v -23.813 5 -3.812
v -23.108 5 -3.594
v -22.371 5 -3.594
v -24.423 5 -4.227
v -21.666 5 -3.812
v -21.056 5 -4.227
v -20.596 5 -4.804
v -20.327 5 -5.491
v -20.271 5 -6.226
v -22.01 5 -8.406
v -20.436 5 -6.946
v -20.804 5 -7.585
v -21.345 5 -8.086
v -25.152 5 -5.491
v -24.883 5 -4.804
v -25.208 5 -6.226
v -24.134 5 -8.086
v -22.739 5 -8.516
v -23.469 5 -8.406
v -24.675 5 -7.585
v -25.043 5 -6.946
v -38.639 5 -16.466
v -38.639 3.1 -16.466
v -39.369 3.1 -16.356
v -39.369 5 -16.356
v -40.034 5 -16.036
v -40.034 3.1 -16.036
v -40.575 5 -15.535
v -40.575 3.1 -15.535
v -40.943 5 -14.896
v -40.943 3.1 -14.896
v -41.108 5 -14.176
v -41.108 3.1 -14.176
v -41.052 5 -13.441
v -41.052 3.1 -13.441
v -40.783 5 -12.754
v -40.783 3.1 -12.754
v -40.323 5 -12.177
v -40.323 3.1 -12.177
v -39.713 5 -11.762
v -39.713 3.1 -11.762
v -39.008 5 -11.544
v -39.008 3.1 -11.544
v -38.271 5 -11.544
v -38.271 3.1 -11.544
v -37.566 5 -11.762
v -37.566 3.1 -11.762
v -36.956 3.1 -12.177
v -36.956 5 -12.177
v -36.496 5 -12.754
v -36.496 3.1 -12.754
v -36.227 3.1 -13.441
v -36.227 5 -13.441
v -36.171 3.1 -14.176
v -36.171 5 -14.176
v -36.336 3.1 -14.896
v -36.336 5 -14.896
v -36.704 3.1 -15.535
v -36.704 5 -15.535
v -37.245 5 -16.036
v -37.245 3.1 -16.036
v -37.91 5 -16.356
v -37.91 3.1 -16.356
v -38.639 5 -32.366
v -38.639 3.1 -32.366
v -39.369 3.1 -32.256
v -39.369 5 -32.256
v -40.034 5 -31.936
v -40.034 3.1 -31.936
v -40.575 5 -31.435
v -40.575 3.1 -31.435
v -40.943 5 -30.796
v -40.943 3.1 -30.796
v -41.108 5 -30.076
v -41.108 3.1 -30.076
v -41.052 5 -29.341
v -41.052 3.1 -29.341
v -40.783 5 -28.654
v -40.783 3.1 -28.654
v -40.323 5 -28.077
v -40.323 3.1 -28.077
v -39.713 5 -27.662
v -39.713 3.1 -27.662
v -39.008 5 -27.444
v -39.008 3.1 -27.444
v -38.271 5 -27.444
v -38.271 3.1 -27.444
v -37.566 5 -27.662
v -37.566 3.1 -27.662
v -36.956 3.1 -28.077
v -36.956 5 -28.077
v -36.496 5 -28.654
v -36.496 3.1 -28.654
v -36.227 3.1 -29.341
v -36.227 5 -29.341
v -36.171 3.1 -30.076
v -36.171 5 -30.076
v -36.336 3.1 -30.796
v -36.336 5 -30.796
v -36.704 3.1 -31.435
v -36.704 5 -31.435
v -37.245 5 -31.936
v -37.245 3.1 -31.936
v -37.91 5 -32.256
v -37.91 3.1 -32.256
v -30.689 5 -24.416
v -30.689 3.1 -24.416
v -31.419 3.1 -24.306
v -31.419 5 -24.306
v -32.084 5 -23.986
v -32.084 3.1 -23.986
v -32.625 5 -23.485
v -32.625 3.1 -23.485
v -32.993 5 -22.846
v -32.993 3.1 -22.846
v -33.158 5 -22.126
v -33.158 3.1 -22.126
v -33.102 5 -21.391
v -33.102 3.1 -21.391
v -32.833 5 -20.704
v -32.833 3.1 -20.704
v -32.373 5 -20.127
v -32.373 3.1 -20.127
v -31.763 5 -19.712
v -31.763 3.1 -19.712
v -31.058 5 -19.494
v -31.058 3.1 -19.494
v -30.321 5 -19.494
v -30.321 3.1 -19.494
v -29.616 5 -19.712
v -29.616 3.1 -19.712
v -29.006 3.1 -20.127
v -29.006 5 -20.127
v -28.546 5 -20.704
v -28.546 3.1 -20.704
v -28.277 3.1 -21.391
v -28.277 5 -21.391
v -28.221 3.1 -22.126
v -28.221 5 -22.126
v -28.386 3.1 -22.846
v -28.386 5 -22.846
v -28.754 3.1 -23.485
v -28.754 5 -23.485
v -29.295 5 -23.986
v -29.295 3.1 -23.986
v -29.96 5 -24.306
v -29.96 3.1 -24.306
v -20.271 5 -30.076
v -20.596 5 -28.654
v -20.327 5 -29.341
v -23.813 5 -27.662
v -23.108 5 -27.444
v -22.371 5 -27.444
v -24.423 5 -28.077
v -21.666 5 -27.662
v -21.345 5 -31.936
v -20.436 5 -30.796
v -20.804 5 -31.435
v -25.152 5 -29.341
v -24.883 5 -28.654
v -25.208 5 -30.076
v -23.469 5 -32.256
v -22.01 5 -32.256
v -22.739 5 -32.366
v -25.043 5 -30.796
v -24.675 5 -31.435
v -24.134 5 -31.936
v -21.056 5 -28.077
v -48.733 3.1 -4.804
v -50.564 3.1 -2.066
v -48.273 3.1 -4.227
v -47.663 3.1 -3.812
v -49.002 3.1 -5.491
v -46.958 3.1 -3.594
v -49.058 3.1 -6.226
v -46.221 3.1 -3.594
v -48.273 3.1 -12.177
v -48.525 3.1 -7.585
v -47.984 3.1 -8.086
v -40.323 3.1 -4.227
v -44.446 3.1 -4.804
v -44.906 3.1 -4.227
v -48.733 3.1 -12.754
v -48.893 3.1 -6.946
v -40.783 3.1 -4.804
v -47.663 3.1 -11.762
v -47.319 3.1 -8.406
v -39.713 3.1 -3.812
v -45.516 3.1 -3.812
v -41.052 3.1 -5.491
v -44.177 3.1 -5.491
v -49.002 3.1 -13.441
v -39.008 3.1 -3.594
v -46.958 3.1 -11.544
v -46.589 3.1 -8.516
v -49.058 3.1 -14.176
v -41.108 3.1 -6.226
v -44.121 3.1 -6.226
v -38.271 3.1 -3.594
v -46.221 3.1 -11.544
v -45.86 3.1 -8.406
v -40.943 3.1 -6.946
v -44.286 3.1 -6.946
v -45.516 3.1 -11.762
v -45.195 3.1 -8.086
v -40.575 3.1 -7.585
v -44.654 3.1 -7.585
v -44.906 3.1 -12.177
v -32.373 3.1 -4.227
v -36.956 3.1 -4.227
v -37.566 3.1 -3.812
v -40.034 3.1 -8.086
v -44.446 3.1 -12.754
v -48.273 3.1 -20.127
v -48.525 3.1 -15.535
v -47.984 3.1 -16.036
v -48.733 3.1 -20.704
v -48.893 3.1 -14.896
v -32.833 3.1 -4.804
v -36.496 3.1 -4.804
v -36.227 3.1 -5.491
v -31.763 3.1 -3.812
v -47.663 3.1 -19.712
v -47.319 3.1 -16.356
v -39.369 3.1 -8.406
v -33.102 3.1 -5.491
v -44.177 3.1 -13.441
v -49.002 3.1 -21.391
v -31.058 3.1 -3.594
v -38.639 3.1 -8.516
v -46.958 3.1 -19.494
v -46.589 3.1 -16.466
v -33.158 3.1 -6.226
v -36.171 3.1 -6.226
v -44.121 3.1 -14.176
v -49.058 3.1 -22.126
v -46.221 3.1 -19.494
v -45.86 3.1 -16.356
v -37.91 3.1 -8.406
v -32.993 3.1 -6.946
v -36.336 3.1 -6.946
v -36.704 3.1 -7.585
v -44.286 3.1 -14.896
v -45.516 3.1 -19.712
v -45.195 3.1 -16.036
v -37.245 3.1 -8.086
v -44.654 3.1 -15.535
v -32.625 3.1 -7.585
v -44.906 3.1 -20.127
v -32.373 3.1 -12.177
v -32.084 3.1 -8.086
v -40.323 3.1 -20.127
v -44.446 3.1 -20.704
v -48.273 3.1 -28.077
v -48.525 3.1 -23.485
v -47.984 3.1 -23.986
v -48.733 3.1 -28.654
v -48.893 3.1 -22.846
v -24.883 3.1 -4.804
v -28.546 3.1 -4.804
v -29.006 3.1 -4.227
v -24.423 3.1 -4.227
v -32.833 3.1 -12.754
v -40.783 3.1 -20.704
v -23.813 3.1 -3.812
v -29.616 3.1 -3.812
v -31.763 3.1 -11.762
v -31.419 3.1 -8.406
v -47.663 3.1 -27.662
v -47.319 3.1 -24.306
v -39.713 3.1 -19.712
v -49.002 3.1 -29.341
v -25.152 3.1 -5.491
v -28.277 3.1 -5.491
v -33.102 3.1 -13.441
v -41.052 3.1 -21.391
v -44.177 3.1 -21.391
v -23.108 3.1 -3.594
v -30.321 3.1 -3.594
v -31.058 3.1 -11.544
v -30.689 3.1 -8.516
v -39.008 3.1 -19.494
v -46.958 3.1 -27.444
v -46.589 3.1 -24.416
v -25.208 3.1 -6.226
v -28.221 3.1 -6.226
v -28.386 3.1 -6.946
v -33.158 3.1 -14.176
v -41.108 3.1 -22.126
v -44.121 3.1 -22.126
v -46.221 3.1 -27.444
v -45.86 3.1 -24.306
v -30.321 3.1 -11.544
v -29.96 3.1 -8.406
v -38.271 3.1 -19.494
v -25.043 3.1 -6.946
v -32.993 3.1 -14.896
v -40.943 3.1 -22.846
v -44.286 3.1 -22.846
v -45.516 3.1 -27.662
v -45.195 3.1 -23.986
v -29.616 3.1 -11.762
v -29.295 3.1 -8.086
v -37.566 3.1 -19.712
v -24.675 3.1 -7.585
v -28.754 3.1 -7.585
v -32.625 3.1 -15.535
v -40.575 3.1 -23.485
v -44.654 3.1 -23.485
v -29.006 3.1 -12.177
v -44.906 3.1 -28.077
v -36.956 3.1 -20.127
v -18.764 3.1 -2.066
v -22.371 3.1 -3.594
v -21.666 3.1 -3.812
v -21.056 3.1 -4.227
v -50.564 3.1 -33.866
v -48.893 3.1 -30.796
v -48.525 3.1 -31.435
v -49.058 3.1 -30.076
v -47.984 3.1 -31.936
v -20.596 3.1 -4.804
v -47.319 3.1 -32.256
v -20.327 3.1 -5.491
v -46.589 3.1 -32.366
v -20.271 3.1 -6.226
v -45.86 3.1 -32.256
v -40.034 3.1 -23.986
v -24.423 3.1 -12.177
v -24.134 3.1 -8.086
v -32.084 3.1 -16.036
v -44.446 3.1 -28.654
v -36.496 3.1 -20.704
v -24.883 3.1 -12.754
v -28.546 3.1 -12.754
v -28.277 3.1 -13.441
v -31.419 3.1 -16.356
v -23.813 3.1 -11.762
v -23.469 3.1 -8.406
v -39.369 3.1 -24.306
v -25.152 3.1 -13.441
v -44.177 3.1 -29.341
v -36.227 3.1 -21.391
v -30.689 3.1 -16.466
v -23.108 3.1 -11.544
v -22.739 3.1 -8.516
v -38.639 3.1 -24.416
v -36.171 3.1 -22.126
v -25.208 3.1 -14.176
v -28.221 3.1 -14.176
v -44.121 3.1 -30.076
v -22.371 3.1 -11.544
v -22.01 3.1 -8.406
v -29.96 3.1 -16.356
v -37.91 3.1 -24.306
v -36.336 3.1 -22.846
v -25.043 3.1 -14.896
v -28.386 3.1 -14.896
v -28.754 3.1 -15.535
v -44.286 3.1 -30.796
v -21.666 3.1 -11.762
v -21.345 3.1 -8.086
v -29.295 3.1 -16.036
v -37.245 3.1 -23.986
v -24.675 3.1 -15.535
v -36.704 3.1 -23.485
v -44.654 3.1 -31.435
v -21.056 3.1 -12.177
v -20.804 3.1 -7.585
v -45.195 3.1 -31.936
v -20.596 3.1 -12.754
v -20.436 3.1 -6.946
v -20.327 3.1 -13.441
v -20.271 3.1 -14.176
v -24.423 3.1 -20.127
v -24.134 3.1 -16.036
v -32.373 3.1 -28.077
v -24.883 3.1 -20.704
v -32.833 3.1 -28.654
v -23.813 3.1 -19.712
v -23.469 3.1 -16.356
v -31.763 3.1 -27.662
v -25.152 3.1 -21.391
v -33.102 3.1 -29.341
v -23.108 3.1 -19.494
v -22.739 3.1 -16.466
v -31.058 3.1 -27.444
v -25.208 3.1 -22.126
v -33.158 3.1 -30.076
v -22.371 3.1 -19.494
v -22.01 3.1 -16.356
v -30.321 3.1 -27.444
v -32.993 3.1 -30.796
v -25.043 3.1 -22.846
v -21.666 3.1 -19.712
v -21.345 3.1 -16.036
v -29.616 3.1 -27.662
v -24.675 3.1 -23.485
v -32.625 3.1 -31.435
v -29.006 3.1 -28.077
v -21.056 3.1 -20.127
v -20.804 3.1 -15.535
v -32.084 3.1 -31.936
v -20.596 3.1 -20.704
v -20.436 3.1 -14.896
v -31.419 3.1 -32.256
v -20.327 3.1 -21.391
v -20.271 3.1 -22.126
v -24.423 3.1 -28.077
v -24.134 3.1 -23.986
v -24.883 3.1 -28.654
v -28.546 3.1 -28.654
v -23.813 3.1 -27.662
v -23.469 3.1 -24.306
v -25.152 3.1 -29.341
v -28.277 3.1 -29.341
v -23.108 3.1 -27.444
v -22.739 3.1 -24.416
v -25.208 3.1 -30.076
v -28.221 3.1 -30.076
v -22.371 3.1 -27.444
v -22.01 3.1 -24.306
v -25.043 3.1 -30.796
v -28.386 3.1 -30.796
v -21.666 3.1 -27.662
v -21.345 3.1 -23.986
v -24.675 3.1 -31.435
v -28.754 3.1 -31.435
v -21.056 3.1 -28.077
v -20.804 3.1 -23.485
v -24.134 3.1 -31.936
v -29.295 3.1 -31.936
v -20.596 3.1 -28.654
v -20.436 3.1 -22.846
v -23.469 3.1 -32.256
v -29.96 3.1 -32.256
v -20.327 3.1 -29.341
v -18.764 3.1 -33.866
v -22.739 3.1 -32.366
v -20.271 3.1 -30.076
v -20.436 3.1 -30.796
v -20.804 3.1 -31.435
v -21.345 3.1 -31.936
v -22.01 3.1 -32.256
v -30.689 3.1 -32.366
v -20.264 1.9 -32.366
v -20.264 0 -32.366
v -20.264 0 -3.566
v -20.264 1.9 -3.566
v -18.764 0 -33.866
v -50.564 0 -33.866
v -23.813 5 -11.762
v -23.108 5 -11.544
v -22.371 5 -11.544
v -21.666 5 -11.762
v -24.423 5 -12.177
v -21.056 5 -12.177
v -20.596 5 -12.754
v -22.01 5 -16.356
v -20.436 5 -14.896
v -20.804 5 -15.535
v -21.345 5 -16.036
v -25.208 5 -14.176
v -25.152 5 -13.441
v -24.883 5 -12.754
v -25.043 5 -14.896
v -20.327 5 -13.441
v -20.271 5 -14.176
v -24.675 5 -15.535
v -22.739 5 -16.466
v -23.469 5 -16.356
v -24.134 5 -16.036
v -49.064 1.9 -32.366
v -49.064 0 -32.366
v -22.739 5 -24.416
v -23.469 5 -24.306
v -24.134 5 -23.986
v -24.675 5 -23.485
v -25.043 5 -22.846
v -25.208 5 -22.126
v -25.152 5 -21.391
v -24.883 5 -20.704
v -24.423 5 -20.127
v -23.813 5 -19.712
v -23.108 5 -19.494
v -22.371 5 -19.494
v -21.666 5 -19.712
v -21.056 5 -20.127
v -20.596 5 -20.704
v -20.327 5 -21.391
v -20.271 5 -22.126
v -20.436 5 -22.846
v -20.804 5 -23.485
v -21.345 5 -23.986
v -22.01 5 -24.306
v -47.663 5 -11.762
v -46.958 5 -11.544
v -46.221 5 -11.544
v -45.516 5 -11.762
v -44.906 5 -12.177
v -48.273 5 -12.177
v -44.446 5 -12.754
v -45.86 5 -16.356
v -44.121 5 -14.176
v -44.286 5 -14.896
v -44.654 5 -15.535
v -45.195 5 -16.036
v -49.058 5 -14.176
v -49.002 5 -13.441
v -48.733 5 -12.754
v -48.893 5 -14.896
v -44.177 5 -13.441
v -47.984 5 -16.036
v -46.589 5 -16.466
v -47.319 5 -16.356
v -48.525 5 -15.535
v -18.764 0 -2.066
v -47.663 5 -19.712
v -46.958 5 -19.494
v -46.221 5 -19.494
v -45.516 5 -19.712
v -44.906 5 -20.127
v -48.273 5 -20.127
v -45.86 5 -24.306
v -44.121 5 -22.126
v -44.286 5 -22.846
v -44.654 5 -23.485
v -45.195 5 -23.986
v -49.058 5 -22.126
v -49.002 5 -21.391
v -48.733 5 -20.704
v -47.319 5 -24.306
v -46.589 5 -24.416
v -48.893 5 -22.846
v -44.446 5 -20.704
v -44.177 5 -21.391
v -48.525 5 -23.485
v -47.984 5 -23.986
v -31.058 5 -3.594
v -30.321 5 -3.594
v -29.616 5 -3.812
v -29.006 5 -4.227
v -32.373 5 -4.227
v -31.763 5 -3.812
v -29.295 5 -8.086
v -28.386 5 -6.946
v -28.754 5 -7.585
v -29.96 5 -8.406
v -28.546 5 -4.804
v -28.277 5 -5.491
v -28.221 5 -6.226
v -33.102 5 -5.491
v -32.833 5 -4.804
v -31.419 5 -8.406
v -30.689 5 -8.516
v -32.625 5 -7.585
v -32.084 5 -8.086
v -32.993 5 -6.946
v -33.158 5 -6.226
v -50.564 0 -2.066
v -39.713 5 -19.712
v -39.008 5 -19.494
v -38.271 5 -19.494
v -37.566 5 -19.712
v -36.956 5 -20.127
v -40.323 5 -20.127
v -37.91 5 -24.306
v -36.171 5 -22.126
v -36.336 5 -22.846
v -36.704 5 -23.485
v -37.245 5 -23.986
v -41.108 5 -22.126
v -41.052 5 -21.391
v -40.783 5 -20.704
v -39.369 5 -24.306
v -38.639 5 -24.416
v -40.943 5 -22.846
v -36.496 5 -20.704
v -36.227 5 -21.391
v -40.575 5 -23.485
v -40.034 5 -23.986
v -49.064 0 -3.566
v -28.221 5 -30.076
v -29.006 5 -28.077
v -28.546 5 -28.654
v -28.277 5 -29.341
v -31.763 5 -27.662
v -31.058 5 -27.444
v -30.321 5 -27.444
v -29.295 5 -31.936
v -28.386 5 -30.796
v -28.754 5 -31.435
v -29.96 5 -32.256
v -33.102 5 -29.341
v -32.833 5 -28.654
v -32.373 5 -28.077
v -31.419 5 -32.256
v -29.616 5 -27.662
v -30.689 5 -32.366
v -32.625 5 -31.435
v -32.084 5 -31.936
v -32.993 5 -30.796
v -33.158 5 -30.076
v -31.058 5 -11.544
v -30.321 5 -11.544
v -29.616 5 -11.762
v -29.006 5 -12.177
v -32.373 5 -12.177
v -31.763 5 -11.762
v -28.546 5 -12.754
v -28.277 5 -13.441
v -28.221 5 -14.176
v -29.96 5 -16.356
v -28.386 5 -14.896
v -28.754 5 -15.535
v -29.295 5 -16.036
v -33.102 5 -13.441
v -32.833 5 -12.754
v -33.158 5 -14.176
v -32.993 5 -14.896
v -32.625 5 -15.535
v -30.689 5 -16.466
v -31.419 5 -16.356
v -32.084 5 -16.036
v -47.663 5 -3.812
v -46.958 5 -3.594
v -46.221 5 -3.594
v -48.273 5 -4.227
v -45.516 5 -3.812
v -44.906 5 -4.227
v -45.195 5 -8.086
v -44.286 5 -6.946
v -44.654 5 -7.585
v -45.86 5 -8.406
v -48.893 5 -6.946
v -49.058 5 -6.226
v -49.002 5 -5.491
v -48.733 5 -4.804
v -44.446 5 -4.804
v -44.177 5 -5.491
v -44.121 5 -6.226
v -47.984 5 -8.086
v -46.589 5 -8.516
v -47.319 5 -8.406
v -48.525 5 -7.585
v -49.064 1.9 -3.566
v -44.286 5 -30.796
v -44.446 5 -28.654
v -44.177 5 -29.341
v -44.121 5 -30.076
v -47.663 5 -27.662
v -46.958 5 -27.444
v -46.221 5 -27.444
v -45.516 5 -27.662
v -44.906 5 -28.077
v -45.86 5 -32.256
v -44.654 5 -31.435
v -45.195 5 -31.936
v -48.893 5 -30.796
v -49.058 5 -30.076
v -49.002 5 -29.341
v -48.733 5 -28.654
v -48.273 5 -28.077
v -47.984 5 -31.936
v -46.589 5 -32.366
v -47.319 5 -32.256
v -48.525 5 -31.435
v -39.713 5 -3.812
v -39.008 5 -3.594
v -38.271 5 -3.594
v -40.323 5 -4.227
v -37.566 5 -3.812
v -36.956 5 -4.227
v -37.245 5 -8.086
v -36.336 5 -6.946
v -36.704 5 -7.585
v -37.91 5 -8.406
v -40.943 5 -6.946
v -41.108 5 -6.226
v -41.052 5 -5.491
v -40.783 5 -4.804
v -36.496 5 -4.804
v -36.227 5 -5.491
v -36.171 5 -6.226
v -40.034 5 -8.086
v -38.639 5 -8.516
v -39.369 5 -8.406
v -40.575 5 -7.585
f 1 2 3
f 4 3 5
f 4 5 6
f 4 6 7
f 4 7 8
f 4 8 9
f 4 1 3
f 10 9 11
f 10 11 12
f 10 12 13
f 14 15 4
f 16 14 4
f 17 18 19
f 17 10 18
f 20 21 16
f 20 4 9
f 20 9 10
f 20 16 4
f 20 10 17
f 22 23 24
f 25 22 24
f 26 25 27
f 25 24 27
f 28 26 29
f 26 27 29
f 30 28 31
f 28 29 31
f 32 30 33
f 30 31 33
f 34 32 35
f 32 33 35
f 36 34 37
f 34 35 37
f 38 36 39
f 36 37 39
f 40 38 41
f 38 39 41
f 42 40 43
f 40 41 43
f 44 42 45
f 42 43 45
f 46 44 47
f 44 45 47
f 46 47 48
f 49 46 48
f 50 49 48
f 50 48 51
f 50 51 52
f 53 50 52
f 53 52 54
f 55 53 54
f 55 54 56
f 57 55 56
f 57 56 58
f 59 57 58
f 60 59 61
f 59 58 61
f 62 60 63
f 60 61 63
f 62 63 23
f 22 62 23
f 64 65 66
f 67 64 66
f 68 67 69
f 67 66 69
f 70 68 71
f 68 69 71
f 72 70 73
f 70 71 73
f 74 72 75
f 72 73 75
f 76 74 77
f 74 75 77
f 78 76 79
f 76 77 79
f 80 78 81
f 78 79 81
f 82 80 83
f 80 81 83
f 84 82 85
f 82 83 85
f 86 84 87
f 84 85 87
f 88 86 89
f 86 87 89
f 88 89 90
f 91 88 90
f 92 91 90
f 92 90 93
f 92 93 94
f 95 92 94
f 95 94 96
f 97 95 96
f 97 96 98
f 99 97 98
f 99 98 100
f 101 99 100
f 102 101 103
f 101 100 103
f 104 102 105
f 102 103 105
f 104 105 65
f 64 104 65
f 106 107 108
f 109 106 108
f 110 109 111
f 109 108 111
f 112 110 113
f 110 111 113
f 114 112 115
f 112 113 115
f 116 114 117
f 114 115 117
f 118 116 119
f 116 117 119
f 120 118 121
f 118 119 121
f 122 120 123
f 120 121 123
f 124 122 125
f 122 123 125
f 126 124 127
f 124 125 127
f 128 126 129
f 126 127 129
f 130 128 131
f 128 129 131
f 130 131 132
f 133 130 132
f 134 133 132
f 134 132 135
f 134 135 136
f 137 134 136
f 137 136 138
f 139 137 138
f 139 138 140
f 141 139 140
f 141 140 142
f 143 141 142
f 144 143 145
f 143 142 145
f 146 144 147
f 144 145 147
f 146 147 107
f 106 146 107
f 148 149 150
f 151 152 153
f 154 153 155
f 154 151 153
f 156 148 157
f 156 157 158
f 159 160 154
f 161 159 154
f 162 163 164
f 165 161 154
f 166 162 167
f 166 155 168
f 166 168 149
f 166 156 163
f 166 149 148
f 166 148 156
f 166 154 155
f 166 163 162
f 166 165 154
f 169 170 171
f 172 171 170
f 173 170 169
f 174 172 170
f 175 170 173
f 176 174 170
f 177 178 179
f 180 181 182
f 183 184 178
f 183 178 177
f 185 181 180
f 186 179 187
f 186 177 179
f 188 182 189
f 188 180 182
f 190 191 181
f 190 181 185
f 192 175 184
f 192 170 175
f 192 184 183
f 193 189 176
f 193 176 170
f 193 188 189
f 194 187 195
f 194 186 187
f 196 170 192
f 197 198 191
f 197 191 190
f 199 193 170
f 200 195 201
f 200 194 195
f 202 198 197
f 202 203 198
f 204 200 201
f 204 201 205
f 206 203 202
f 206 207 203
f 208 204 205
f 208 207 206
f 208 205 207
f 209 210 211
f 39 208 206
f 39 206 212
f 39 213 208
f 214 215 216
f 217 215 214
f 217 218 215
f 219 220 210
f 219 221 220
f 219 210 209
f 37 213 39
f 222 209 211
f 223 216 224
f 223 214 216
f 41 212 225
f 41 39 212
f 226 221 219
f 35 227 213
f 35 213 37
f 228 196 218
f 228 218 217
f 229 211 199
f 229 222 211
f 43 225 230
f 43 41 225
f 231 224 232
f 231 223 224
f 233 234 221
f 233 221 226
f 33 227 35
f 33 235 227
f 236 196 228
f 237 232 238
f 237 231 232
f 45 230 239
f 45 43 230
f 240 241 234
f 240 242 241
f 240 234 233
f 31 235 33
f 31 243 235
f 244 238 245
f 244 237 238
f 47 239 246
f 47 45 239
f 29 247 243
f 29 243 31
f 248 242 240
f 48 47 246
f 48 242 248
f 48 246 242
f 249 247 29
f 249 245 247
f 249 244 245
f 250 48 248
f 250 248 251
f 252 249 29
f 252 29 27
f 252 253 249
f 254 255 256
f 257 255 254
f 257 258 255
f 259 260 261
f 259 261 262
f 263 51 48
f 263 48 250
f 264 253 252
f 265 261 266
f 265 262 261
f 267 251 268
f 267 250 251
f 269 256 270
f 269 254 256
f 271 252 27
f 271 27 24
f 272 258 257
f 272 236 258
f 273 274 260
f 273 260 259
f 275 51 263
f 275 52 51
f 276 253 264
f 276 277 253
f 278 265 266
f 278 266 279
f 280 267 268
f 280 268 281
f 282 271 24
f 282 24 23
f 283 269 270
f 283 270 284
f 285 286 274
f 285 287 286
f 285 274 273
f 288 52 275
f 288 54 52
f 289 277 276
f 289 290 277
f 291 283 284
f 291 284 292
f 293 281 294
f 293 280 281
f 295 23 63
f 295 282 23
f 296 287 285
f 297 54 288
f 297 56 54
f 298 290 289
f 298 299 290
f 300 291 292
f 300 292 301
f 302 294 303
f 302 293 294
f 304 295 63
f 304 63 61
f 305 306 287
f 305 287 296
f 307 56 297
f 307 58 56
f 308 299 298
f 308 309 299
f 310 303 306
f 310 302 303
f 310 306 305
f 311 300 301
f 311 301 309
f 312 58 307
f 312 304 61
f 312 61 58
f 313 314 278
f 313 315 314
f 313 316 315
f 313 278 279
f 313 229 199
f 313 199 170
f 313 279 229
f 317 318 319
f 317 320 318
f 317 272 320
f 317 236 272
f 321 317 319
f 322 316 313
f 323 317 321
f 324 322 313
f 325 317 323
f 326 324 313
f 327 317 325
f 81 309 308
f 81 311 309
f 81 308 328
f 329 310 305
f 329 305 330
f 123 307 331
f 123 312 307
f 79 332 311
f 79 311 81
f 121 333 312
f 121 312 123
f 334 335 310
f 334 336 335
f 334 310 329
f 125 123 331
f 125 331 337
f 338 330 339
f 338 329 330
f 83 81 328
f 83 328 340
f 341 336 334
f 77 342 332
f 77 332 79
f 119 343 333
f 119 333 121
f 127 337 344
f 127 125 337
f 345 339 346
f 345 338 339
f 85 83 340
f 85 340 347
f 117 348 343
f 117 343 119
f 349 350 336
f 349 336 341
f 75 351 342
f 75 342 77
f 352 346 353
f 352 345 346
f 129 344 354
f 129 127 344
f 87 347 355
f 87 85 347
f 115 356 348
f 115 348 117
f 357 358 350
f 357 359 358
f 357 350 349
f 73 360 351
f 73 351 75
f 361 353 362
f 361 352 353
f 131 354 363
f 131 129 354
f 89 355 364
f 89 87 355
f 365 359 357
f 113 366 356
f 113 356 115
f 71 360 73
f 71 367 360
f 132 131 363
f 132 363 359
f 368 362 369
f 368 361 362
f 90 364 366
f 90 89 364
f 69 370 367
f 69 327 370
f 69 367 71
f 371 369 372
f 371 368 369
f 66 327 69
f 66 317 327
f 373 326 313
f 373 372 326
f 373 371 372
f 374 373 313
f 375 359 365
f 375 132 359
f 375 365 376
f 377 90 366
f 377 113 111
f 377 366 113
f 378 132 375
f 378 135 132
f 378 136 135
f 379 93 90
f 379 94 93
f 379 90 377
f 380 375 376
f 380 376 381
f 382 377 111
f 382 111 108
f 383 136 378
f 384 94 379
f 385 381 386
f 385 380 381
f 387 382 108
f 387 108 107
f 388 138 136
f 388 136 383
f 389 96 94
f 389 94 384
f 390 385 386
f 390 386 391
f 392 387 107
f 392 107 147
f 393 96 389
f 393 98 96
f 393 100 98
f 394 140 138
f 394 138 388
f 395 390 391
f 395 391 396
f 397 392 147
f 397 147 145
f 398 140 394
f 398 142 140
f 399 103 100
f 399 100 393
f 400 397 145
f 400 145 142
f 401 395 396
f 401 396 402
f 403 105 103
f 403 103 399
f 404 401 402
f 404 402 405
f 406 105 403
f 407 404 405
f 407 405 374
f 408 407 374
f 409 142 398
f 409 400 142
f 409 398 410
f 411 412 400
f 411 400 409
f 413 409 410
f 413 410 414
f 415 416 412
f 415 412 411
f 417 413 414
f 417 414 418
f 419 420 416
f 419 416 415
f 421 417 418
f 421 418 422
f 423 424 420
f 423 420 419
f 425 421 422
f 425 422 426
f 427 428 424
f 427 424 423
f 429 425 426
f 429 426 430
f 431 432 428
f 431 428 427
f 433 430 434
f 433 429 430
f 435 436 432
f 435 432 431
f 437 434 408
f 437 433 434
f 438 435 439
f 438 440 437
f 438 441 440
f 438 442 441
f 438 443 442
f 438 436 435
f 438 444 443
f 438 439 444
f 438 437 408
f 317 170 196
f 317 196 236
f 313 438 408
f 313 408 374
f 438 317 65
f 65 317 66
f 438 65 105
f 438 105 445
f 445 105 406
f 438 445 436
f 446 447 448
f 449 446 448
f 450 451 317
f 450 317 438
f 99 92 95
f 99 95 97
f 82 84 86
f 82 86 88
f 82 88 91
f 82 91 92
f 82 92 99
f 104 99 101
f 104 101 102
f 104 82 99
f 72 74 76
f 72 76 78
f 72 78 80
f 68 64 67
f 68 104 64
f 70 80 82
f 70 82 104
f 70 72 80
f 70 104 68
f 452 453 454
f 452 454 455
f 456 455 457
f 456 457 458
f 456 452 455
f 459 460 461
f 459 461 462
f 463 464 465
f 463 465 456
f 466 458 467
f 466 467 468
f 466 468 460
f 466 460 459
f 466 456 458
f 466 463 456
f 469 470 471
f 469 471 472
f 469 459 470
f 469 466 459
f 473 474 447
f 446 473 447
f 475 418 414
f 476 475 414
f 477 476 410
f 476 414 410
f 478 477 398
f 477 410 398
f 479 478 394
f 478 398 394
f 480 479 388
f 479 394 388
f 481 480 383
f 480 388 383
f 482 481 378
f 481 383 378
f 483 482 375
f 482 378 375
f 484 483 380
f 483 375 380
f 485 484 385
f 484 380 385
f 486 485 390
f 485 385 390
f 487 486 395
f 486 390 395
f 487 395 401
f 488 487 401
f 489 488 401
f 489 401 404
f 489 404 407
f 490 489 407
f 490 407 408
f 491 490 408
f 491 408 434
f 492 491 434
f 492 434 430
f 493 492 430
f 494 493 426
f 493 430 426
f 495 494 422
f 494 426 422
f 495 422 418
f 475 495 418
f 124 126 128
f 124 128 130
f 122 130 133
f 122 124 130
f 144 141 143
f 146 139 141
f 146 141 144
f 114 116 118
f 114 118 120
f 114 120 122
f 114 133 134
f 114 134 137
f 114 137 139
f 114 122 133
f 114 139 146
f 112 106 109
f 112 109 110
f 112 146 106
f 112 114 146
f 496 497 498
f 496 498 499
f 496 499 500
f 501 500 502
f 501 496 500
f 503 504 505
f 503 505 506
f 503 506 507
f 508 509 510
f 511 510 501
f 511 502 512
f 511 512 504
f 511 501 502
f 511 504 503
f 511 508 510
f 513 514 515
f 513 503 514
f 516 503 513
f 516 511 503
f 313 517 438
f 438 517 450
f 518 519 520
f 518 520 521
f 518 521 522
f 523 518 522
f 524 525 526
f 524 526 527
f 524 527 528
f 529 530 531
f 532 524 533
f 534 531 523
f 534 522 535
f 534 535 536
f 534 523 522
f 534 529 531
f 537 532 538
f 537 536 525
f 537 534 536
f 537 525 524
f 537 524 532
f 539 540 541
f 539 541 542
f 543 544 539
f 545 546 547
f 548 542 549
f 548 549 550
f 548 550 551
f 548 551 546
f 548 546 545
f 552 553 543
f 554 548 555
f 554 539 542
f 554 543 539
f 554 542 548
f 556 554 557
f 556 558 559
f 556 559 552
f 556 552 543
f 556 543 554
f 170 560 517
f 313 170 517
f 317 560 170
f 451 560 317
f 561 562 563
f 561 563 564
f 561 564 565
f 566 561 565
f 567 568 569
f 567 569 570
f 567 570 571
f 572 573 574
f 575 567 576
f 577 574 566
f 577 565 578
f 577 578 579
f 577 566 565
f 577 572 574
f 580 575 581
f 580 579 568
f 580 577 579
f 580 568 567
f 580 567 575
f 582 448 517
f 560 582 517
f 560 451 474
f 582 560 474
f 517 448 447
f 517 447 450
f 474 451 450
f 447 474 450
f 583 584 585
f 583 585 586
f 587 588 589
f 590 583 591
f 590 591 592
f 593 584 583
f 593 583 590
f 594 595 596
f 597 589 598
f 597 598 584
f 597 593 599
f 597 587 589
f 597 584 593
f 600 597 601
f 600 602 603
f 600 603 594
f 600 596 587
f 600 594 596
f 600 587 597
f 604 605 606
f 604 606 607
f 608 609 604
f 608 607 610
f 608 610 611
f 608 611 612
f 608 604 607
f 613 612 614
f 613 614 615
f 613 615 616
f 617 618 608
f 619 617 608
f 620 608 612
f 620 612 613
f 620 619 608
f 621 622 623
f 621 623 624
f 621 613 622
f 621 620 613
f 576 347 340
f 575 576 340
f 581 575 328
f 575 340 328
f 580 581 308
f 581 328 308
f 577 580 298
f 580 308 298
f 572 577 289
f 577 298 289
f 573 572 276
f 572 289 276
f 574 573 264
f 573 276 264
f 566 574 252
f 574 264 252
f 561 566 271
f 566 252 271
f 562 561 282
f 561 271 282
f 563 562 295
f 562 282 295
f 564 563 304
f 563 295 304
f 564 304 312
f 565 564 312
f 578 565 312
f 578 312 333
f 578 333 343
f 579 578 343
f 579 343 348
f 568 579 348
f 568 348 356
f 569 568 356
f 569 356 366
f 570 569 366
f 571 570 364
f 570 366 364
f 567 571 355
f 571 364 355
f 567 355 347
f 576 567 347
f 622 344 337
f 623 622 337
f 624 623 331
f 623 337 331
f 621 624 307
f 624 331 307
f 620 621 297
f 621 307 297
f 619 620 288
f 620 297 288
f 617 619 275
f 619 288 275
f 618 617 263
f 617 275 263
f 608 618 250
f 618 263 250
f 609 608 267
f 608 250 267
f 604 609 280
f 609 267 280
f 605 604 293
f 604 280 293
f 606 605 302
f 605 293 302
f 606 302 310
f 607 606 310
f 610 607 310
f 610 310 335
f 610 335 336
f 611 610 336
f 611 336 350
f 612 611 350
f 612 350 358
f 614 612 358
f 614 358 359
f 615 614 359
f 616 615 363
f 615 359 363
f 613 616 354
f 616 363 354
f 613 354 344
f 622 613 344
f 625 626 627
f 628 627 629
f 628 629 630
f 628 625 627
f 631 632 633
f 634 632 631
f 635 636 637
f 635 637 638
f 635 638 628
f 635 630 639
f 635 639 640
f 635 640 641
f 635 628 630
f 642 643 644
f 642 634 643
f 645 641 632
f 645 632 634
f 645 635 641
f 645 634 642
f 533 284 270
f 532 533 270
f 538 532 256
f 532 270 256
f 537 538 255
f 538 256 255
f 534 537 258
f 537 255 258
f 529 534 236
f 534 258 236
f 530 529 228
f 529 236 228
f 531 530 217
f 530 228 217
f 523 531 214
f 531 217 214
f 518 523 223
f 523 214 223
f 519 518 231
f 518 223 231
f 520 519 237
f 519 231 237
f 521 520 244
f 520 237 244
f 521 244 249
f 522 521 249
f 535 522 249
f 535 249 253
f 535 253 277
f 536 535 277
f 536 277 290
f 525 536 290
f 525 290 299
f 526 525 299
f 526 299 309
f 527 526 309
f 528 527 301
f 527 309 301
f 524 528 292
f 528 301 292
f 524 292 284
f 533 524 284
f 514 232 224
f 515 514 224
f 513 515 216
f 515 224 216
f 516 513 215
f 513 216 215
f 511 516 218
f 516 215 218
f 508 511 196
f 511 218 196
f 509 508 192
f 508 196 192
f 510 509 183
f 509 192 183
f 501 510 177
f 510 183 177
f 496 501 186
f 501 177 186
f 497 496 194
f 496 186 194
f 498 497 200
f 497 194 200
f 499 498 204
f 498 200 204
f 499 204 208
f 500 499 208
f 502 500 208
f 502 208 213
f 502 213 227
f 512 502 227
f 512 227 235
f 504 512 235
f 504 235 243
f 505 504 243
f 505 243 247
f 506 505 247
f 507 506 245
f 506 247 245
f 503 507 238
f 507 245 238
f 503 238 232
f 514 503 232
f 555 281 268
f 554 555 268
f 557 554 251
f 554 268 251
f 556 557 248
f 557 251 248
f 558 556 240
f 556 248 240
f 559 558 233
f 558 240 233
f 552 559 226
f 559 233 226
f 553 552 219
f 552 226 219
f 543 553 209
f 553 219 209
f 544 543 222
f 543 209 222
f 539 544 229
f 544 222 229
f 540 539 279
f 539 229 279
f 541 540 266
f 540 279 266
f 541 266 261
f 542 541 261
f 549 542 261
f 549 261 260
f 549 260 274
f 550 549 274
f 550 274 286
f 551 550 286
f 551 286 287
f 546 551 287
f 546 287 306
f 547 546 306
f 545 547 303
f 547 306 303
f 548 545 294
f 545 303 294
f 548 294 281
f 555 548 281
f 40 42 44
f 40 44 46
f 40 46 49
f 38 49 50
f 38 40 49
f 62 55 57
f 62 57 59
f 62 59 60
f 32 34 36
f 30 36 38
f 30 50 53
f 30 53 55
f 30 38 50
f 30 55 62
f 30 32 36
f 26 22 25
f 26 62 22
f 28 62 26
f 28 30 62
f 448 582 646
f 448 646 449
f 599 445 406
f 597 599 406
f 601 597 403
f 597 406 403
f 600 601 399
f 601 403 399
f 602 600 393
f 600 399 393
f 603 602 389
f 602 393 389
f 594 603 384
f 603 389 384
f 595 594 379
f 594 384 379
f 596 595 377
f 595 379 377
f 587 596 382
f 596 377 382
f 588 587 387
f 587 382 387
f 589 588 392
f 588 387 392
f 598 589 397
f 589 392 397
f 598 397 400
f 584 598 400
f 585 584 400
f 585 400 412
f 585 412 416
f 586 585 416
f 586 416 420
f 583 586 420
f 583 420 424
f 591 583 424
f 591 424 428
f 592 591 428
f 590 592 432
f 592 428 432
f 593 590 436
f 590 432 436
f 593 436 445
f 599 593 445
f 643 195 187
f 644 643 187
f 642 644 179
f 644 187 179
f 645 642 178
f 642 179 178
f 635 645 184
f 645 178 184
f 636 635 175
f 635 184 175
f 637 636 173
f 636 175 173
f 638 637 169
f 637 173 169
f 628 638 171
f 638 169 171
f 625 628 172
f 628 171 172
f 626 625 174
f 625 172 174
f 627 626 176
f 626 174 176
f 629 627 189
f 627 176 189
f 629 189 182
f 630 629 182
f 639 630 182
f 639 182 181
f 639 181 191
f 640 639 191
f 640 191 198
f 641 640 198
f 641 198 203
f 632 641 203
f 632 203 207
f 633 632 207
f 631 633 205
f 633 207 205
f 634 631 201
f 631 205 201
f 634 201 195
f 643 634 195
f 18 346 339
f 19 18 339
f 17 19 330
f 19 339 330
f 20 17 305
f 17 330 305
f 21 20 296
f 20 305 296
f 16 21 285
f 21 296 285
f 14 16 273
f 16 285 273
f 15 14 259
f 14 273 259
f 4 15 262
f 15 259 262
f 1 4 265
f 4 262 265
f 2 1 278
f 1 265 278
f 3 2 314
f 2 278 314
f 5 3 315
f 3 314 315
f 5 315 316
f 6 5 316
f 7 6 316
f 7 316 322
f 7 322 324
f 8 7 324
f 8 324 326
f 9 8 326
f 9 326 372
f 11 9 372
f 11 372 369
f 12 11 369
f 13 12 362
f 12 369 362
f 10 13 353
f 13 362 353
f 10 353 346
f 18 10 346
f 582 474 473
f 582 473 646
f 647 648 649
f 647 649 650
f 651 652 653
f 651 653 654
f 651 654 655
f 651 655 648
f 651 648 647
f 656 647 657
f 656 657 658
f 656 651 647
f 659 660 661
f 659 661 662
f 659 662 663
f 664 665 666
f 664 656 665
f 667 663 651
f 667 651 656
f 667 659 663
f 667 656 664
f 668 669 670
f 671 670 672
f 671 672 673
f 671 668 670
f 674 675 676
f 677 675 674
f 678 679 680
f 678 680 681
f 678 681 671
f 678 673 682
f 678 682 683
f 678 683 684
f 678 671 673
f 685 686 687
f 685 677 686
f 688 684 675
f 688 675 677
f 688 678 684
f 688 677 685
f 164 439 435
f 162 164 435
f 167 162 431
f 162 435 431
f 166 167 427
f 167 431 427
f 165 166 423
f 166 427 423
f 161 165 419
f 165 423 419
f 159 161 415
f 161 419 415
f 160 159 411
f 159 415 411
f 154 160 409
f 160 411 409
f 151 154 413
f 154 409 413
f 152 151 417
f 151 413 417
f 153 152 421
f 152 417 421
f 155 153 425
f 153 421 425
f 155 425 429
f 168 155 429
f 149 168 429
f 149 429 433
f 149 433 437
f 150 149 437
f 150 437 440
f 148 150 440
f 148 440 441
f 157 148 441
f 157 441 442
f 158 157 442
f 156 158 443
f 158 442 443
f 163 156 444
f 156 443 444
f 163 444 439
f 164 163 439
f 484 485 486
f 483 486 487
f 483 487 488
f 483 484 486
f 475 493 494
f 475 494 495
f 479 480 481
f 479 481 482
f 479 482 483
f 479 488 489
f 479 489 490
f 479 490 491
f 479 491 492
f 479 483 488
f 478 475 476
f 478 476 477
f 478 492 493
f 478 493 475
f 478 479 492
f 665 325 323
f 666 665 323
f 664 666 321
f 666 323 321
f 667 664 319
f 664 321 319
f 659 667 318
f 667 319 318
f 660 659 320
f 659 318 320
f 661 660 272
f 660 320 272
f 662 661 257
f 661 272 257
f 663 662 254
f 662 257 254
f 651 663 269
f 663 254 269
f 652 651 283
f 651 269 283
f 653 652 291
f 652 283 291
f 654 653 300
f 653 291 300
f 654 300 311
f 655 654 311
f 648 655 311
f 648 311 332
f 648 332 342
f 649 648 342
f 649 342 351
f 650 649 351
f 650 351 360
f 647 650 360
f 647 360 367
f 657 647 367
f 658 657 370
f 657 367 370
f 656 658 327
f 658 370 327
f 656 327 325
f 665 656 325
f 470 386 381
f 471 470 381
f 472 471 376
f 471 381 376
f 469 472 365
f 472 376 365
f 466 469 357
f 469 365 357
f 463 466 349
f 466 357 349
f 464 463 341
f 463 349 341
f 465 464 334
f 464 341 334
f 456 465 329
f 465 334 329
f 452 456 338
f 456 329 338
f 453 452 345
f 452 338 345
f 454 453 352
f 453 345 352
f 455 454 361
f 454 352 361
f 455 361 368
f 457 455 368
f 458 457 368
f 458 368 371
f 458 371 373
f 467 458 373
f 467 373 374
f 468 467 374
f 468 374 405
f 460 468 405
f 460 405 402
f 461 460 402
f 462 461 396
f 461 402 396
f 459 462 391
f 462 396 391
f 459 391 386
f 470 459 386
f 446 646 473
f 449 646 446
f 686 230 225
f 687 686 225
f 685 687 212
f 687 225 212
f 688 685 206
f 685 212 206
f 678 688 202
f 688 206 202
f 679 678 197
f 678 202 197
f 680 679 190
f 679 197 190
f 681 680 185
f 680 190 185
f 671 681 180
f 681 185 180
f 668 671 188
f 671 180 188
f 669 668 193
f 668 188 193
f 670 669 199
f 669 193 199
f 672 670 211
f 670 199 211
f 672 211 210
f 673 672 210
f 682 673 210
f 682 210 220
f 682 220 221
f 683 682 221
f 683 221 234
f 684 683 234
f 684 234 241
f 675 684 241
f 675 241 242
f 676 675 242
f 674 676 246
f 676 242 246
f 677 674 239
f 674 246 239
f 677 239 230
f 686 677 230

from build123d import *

# Parameters (mm, degrees)
SKETCH1_W           = 31.8
SKETCH1_H           = 31.8
BOSS_EXTRUDE1_DEPTH = 3.1
SKETCH2_W           = 28.8
SKETCH2_H           = 28.8
CUT_EXTRUDE1_DEPTH  = 1.9
SKETCH3_R           = 2.475
BOSS_EXTRUDE2_DEPTH = 1.9


with BuildPart() as part:
    # Sketch1 → Boss-Extrude1 (new body)
    with BuildSketch(Plane(origin=(0, 0, 0), x_dir=(1, 0, 0), z_dir=(0, 1, 0))):
        with Locations((-34.664493697, 17.966451592)):
            Rectangle(SKETCH1_W, SKETCH1_H)
    extrude(amount=BOSS_EXTRUDE1_DEPTH)

    # Sketch2 → Cut-Extrude1 (cut)
    with BuildSketch(Plane.XZ):
        with Locations((-34.664493697, -17.966451592)):
            Rectangle(SKETCH2_W, SKETCH2_H)
    extrude(amount=-CUT_EXTRUDE1_DEPTH, mode=Mode.SUBTRACT)

    # Sketch3 → Boss-Extrude2 (add)
    with BuildSketch(Plane(origin=(0, 3.1, 0), x_dir=(1, 0, 0), z_dir=(0, 1, 0))):
        with Locations(Location((-46.589493697, 29.891451592, 0), (0, 0, 90))):
            Circle(SKETCH3_R)
        with Locations(Location((-30.689493697, 29.891451592, 0), (0, 0, 90))):
            Circle(SKETCH3_R)
        with Locations(Location((-38.639493697, 29.891451592, 0), (0, 0, 90))):
            Circle(SKETCH3_R)
        with Locations(Location((-22.739493697, 29.891451592, 0), (0, 0, 90))):
            Circle(SKETCH3_R)
        with Locations(Location((-46.589493697, 21.941451592, 0), (0, 0, 90))):
            Circle(SKETCH3_R)
        with Locations(Location((-38.639493697, 21.941451592, 0), (0, 0, 90))):
            Circle(SKETCH3_R)
        with Locations(Location((-30.689493697, 21.941451592, 0), (0, 0, 90))):
            Circle(SKETCH3_R)
        with Locations(Location((-22.739493697, 21.941451592, 0), (0, 0, 90))):
            Circle(SKETCH3_R)
        with Locations(Location((-22.739493697, 13.991451592, 0), (0, 0, 90))):
            Circle(SKETCH3_R)
        with Locations(Location((-22.739493697, 6.041451592, 0), (0, 0, 90))):
            Circle(SKETCH3_R)
        with Locations(Location((-30.689493697, 13.991451592, 0), (0, 0, 90))):
            Circle(SKETCH3_R)
        with Locations(Location((-30.689493697, 6.041451592, 0), (0, 0, 90))):
            Circle(SKETCH3_R)
        with Locations(Location((-38.639493697, 13.991451592, 0), (0, 0, 90))):
            Circle(SKETCH3_R)
        with Locations(Location((-38.639493697, 6.041451592, 0), (0, 0, 90))):
            Circle(SKETCH3_R)
        with Locations(Location((-46.589493697, 13.991451592, 0), (0, 0, 90))):
            Circle(SKETCH3_R)
        with Locations(Location((-46.589493697, 6.041451592, 0), (0, 0, 90))):
            Circle(SKETCH3_R)
    extrude(amount=BOSS_EXTRUDE2_DEPTH)


solid = part.part
